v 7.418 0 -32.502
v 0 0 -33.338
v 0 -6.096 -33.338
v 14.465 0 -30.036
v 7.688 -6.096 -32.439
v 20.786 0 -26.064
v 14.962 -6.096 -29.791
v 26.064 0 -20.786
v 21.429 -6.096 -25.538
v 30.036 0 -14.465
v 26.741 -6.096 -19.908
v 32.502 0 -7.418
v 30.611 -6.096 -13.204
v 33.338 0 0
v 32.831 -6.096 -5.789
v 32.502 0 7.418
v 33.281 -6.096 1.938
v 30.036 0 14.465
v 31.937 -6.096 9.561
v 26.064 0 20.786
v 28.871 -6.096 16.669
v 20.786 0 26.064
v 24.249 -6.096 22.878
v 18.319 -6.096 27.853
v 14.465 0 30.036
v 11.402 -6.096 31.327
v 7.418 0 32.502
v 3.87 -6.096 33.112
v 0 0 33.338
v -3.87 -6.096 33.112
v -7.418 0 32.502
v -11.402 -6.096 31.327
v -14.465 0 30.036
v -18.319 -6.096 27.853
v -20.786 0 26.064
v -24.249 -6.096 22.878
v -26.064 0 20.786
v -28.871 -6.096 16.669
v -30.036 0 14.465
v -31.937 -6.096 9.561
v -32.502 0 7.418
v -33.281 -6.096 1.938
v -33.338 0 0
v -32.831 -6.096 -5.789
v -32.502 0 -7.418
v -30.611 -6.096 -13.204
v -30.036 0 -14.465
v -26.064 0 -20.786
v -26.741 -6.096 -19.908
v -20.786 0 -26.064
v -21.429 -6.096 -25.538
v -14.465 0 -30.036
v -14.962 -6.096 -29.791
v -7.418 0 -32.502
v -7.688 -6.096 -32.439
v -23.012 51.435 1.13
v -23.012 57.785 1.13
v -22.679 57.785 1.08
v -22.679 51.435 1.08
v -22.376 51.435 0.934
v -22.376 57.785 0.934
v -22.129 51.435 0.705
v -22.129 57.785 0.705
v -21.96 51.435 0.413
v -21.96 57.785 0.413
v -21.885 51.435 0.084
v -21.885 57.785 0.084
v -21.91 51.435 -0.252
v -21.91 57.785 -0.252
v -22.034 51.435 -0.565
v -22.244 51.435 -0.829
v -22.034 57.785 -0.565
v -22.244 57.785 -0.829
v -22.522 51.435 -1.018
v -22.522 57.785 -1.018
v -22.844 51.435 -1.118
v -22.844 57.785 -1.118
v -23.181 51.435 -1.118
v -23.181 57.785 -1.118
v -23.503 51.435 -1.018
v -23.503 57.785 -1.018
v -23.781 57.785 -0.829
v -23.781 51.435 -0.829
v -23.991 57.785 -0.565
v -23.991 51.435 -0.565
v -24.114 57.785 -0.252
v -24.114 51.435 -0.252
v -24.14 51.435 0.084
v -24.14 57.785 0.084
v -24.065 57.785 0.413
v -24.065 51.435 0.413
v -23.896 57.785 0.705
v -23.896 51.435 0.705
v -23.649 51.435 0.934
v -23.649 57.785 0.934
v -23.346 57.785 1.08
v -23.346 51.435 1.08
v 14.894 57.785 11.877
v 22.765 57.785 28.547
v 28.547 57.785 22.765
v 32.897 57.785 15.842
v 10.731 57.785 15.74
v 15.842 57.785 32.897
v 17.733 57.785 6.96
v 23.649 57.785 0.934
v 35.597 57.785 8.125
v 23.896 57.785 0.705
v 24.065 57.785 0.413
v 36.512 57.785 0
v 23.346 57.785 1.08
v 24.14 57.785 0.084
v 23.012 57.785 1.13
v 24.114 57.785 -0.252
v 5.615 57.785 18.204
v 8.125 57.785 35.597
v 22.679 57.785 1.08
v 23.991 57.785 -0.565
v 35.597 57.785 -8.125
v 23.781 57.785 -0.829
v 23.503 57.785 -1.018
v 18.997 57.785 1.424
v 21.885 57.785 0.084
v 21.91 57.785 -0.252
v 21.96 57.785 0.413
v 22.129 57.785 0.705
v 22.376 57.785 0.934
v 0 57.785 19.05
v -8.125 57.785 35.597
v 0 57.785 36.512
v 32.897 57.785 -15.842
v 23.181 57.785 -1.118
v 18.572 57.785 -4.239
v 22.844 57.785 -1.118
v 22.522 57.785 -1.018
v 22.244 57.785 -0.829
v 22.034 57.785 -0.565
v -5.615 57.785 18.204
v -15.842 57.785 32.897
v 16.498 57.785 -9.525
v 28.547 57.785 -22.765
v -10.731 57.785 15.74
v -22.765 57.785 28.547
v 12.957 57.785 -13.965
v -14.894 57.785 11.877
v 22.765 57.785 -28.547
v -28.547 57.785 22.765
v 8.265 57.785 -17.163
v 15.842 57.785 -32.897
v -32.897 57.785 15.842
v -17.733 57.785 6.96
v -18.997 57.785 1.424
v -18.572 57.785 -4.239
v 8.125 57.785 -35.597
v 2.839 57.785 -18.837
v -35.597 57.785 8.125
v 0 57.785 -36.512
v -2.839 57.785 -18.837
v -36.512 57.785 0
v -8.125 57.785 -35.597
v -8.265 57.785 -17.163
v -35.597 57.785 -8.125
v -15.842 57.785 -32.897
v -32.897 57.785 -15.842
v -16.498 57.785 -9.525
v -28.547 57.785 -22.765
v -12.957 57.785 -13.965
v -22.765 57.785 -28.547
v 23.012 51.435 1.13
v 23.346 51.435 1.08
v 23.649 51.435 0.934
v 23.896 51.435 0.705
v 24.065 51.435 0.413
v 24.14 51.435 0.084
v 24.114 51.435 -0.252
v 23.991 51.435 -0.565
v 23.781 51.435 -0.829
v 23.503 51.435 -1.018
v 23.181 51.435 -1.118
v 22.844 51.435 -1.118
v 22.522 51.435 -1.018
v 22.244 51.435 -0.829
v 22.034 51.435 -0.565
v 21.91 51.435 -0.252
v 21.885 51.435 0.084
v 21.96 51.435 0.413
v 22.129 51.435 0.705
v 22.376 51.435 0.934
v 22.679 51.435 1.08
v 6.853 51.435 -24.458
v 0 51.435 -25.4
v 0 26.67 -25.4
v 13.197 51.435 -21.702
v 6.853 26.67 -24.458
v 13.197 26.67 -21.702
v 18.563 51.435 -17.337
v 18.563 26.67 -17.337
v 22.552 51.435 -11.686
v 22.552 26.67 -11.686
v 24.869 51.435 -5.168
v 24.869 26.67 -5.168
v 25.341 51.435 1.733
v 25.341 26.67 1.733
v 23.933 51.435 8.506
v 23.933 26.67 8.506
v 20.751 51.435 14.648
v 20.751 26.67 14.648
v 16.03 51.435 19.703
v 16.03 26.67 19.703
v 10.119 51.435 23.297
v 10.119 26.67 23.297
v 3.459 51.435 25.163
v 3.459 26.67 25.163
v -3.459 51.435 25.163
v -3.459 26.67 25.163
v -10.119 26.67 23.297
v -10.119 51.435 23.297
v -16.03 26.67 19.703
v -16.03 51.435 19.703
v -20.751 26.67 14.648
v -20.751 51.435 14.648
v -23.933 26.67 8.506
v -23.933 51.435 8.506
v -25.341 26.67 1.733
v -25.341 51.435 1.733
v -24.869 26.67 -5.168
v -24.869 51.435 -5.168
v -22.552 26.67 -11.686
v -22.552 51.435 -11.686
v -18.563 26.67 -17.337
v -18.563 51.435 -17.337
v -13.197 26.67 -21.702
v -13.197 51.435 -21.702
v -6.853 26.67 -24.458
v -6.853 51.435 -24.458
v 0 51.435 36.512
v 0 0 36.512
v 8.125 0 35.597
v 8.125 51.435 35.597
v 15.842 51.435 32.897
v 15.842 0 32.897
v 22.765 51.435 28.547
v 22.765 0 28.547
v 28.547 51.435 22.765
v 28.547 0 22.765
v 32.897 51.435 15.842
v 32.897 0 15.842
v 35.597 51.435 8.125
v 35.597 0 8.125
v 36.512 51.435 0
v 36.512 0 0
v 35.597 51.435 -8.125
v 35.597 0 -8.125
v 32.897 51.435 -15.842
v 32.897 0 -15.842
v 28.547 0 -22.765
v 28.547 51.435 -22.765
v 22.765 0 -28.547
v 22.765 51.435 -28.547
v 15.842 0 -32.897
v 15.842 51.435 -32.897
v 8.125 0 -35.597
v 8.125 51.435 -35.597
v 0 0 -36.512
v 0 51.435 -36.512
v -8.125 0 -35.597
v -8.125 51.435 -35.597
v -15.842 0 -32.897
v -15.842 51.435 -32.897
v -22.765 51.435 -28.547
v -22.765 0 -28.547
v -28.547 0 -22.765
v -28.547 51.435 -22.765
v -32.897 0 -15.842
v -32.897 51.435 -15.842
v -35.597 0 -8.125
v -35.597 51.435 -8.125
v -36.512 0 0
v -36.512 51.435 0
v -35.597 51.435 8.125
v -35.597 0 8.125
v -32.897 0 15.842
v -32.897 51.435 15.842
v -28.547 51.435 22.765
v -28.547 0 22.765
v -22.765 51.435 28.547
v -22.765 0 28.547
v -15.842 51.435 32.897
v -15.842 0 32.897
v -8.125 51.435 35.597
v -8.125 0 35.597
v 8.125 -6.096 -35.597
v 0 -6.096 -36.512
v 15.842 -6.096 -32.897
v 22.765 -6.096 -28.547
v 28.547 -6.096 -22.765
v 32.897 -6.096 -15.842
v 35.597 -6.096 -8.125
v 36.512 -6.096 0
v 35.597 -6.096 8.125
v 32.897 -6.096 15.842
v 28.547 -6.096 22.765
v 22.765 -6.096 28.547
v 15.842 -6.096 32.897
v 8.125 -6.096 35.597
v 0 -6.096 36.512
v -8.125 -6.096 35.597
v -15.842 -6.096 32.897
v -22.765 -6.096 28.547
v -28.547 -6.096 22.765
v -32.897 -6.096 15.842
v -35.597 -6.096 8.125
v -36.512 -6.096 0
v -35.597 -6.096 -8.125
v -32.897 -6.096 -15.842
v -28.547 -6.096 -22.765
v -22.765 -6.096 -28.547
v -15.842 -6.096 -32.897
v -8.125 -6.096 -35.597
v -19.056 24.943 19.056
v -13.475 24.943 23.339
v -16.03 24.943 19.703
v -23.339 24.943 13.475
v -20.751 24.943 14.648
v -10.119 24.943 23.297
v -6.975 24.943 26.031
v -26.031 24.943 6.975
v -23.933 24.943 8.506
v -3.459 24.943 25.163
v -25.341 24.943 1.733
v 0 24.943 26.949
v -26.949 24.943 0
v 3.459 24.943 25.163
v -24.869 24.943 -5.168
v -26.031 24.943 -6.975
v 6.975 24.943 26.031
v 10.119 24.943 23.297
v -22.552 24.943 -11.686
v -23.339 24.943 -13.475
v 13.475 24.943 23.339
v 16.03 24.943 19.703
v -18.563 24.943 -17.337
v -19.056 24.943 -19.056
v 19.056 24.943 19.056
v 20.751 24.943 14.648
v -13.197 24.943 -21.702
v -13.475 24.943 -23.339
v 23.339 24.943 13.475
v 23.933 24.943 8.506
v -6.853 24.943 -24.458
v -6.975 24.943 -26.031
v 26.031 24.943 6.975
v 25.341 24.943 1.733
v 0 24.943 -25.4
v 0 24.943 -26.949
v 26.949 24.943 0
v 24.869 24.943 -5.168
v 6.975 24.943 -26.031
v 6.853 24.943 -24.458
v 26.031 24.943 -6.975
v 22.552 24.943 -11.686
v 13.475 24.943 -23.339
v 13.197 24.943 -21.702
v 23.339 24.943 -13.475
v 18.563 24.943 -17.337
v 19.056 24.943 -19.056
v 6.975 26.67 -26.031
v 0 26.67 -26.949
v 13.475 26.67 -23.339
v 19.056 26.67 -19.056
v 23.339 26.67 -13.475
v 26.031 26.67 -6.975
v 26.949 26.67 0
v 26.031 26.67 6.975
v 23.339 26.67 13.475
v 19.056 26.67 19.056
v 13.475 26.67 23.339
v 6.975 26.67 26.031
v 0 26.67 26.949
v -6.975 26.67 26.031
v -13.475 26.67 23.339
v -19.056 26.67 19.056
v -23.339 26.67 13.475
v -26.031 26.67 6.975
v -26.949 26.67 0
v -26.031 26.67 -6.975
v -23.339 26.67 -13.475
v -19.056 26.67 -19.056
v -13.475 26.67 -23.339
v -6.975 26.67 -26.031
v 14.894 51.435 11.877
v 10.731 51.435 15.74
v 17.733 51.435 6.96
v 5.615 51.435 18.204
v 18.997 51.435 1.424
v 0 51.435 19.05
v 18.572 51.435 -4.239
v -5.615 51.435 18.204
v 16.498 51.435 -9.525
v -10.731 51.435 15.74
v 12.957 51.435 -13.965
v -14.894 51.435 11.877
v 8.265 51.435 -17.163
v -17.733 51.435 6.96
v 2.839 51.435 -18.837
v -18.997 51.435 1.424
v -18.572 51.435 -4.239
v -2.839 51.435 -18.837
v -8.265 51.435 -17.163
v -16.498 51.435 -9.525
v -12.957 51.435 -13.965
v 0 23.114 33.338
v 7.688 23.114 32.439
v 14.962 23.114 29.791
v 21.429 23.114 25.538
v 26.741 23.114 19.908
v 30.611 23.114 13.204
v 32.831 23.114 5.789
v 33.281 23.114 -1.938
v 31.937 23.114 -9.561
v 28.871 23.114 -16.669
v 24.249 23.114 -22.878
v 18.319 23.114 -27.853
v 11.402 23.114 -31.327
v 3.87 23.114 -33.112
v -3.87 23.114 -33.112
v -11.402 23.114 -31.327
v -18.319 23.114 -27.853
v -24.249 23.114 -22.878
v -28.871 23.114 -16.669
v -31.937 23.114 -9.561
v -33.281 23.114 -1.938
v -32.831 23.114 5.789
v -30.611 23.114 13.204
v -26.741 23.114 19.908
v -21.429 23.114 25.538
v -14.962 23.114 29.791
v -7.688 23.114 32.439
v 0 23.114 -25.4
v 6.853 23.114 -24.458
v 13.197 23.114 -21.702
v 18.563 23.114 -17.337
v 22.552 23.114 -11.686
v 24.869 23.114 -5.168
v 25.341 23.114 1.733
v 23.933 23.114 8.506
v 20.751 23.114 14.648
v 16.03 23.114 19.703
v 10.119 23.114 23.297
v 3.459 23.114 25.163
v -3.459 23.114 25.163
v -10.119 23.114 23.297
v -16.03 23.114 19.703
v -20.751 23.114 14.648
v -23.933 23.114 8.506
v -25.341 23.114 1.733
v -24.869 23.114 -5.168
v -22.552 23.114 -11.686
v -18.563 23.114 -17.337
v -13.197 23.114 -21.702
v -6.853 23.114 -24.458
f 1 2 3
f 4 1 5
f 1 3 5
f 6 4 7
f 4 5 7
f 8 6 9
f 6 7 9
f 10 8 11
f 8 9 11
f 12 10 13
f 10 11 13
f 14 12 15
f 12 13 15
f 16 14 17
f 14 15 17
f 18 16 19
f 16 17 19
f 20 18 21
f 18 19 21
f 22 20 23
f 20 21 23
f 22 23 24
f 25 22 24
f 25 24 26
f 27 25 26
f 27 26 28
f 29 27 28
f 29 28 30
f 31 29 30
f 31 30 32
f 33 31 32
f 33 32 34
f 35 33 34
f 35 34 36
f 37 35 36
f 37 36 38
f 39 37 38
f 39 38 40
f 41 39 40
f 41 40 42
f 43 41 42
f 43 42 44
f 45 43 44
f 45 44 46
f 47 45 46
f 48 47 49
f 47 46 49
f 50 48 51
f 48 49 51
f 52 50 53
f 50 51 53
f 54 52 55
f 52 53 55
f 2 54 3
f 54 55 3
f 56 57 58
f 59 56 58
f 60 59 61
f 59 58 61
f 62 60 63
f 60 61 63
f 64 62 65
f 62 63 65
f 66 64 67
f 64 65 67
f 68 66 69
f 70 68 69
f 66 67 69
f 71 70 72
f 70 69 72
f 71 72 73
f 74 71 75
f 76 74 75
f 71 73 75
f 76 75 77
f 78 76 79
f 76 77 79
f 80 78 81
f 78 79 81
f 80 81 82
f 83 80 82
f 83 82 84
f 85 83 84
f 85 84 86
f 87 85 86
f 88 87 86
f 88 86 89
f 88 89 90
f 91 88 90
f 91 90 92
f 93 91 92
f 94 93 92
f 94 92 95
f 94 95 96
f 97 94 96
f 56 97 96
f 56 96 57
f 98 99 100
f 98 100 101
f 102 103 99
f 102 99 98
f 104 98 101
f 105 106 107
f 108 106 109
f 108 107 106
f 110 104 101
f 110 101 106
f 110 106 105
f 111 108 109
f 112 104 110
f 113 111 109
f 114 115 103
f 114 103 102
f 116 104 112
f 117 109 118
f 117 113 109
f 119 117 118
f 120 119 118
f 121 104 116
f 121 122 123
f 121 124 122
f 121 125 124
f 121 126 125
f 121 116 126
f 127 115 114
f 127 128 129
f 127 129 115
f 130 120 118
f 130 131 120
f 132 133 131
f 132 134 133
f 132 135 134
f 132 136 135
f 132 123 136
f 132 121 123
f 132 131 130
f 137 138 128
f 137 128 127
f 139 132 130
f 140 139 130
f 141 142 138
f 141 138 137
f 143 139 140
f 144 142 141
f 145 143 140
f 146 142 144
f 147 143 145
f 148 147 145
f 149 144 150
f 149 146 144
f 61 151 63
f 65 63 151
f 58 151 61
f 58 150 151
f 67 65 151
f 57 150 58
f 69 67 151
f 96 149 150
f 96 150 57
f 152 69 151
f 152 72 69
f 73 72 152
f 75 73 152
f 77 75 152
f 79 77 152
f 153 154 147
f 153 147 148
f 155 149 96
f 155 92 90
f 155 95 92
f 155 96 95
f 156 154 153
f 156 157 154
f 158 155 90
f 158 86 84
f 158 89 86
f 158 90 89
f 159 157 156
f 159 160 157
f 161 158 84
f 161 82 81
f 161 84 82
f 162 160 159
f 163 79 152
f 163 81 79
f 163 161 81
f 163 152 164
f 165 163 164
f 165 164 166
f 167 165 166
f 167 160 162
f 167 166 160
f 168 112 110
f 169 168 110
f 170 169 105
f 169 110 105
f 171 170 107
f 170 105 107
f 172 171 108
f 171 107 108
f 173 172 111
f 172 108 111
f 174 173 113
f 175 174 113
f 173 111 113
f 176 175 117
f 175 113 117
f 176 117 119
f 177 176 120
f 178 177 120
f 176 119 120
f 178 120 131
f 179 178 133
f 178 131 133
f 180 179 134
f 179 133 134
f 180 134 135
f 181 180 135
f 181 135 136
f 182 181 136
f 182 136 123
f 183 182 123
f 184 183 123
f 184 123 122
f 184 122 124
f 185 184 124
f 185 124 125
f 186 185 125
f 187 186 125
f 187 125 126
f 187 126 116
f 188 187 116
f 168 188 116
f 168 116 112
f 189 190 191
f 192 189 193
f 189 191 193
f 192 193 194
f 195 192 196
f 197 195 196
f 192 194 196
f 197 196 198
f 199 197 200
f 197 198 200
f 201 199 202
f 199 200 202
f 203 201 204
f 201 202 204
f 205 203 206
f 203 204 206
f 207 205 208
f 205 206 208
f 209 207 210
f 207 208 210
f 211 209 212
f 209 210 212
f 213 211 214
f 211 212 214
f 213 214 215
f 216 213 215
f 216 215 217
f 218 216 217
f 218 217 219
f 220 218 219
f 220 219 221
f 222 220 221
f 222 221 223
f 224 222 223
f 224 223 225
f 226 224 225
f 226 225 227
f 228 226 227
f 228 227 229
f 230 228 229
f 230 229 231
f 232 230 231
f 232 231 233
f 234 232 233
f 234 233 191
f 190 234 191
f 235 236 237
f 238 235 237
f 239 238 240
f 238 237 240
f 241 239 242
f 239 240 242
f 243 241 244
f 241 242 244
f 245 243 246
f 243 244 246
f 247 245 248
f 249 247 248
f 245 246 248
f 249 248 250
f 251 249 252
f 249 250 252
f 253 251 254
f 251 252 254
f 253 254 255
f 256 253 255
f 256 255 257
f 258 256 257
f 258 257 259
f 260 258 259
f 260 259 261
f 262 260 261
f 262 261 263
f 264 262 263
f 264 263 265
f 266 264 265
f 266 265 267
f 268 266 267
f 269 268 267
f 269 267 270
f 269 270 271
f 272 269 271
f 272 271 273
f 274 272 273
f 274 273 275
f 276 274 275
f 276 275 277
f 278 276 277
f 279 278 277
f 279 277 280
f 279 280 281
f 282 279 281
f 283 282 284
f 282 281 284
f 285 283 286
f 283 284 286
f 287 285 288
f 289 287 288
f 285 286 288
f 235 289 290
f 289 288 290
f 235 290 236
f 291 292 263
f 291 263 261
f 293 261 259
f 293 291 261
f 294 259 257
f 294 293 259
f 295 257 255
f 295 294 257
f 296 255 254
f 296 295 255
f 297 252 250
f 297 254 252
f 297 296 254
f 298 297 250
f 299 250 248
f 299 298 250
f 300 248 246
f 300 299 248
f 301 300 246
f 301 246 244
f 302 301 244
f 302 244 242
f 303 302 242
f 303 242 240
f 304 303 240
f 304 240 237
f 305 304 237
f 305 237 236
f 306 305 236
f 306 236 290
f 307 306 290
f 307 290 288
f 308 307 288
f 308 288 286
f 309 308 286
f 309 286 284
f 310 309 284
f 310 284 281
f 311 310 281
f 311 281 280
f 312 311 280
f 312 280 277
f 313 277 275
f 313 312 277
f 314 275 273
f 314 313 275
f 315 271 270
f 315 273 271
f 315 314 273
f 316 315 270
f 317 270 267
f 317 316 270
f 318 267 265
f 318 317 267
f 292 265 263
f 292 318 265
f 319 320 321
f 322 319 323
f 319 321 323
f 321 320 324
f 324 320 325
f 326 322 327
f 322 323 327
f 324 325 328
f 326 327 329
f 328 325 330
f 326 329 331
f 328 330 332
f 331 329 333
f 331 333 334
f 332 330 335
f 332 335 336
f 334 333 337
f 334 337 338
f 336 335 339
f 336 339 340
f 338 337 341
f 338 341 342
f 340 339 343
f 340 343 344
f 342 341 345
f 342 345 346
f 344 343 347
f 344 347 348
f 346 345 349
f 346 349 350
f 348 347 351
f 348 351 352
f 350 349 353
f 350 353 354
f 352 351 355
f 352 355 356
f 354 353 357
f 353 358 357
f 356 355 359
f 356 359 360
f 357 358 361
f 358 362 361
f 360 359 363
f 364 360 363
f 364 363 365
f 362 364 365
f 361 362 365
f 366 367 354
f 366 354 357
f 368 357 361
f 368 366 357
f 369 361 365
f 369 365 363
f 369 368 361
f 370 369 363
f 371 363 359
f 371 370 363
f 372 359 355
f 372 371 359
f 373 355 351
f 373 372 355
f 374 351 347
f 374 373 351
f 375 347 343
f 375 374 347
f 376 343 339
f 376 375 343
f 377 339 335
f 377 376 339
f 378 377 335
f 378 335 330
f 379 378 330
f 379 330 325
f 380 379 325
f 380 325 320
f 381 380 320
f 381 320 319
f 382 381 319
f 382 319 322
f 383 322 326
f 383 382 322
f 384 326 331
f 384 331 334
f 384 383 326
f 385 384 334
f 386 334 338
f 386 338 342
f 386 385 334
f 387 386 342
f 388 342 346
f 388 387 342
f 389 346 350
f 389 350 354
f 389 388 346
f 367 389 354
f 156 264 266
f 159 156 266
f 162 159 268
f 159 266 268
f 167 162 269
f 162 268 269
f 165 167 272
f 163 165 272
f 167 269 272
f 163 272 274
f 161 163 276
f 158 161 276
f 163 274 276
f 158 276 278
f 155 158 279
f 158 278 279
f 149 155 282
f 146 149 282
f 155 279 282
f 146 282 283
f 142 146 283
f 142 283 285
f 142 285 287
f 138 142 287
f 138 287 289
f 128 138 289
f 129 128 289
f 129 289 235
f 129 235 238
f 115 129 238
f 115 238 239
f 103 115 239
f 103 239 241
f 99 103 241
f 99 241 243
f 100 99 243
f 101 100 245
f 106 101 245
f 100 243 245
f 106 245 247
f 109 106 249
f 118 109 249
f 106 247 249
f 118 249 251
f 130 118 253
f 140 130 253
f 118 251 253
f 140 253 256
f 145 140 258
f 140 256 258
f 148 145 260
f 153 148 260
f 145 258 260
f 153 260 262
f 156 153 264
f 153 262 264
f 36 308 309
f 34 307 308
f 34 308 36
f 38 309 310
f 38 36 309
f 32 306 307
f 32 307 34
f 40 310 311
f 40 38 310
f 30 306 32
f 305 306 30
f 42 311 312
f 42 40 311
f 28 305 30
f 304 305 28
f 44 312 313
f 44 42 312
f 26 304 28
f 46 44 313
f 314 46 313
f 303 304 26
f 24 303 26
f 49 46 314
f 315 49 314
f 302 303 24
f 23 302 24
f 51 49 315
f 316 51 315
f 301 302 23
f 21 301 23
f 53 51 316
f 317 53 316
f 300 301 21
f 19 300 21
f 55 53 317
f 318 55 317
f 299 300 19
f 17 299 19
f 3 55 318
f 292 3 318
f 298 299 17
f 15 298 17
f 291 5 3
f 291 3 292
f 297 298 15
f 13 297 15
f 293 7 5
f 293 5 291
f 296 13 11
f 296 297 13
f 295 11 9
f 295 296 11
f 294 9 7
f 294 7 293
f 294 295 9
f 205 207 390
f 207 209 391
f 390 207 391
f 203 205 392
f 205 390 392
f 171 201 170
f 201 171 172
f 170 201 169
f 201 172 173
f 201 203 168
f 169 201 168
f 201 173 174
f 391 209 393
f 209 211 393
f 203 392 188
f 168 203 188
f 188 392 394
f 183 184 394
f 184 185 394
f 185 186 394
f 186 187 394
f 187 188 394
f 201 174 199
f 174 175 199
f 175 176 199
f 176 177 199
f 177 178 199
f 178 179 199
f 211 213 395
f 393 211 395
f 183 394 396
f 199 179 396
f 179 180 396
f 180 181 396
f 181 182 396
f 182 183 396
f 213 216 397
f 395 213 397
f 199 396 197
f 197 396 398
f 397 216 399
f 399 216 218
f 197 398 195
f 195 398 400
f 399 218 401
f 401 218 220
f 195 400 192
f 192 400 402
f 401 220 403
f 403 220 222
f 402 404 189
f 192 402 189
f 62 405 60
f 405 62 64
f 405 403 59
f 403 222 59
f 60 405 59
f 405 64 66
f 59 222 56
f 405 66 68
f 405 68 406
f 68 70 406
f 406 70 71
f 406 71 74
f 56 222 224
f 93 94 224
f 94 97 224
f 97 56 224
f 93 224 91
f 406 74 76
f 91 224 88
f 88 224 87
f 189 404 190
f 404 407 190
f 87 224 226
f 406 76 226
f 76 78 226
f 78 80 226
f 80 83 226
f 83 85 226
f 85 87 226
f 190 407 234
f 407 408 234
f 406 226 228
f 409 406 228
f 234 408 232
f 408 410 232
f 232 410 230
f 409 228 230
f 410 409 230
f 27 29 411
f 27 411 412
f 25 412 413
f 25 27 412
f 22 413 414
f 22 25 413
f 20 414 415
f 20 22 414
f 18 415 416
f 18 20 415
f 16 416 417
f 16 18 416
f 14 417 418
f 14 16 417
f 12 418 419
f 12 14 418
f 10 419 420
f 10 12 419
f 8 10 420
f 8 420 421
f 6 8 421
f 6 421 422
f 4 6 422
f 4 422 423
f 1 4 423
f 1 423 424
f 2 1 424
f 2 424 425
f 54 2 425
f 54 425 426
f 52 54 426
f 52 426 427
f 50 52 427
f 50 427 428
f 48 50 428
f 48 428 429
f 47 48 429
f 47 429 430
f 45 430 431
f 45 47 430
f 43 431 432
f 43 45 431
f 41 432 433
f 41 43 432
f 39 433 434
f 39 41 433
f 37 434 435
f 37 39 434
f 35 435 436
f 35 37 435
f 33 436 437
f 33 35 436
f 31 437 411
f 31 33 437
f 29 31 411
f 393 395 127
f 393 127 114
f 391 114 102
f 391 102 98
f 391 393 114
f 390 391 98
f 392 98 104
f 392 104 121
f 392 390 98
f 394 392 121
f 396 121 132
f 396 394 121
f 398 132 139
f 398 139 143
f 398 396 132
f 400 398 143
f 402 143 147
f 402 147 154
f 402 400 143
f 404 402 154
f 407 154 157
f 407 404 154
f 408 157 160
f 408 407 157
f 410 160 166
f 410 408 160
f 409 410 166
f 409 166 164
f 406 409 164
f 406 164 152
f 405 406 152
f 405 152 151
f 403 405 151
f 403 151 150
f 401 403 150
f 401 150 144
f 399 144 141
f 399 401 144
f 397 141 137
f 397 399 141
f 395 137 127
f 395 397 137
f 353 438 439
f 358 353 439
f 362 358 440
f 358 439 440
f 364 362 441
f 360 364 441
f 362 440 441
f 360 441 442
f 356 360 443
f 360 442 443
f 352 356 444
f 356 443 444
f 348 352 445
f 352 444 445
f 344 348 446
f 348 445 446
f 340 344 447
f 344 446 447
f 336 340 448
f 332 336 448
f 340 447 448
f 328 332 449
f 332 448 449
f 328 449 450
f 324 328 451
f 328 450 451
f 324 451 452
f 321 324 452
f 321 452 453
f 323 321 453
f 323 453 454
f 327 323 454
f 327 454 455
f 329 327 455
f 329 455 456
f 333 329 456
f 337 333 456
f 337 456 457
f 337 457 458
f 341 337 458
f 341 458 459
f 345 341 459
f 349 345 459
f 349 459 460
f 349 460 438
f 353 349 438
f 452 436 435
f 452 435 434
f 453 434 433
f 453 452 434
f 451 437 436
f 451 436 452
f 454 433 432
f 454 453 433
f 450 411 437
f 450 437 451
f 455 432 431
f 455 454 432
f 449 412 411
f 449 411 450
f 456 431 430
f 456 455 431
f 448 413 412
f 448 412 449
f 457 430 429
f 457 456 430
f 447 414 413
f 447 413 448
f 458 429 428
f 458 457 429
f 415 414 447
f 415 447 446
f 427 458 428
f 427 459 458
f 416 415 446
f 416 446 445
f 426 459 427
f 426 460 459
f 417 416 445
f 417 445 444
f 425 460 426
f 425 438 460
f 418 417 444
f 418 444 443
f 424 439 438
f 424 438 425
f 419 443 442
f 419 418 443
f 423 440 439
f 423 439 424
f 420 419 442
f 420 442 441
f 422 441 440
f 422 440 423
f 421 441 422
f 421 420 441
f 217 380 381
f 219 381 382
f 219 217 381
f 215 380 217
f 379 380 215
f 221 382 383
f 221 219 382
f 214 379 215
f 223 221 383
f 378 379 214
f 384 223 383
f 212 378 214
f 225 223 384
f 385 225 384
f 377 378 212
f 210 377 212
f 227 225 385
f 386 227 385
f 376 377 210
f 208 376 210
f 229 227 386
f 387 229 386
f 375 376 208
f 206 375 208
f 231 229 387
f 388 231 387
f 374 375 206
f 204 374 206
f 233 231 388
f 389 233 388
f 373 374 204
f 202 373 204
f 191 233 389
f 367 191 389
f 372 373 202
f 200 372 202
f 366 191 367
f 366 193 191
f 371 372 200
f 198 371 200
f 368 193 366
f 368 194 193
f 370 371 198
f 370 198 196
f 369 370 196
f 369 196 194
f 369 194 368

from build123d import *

# Parameters (mm, degrees)
SKETCH1_R           = 36.5125
SKETCH1_R_2         = 33.3375
BOSS_EXTRUDE1_DEPTH = 51.435
BOSS_EXTRUDE5_START = 6.096
SKETCH6_R           = 36.5125
SKETCH6_R_2         = 33.3375
BOSS_EXTRUDE5_DEPTH = 6.096
SKETCH12_R          = 33.3375
SKETCH12_R_2        = 25.4
BOSS_EXTRUDE8_DEPTH = 28.321
SKETCH2_R           = 36.5125
SKETCH2_R_2         = 19.05
BOSS_EXTRUDE2_DEPTH = 6.35
SKETCH4_R           = 26.9494
CUT_EXTRUDE1_DEPTH  = 1.7272
SKETCH5_R           = 1.1303
CUT_EXTRUDE5_DEPTH  = 83.140778384


with BuildPart() as part:
    # Sketch1 → Boss-Extrude1 (new body)
    with BuildSketch(Plane(origin=(0, 0, 0), x_dir=(1, 0, 0), z_dir=(0, 1, 0))):
        with Locations(Location((0, 0, 0), (0, 0, 270))):
            Circle(SKETCH1_R)
        with Locations(Location((0, 0, 0), (0, 0, 270))):
            Circle(SKETCH1_R_2, mode=Mode.SUBTRACT)
    extrude(amount=BOSS_EXTRUDE1_DEPTH)

    # Sketch6 → Boss-Extrude5 (add)
    with BuildSketch(Plane.XZ.offset(BOSS_EXTRUDE5_START)):
        with Locations(Location((0, 0, 0), (0, 0, 270))):
            Circle(SKETCH6_R)
        with Locations(Location((0, 0, 0), (0, 0, 270))):
            Circle(SKETCH6_R_2, mode=Mode.SUBTRACT)
    extrude(amount=-BOSS_EXTRUDE5_DEPTH)

    # Sketch12 → Boss-Extrude8 (add)
    with BuildSketch(Plane.XZ.offset(-23.114)):
        with Locations(Location((0, 0, 0), (0, 0, 270))):
            Circle(SKETCH12_R)
        with Locations(Location((0, 0, 0), (0, 0, 270))):
            Circle(SKETCH12_R_2, mode=Mode.SUBTRACT)
    extrude(amount=-BOSS_EXTRUDE8_DEPTH)

    # Sketch2 → Boss-Extrude2 (add)
    with BuildSketch(Plane(origin=(0, 51.435, 0), x_dir=(1, 0, 0), z_dir=(0, 1, 0))):
        with Locations(Location((0, 0, 0), (0, 0, 90))):
            Circle(SKETCH2_R)
        with Locations(Location((0, 0, 0), (0, 0, 270))):
            Circle(SKETCH2_R_2, mode=Mode.SUBTRACT)
    extrude(amount=BOSS_EXTRUDE2_DEPTH)

    # Sketch4 → Cut-Extrude1 (cut)
    with BuildSketch(Plane.XZ.offset(-26.67)):
        with Locations(Location((0, 0, 0), (0, 0, 270))):
            Circle(SKETCH4_R)
    extrude(amount=CUT_EXTRUDE1_DEPTH, mode=Mode.SUBTRACT)

    # Sketch5 → Cut-Extrude5 (cut, through all)
    with BuildSketch(Plane(origin=(0, 57.785, 0), x_dir=(1, 0, 0), z_dir=(0, 1, 0))):
        with Locations(Location((-23.0124, 0, 0), (0, 0, 270))):
            Circle(SKETCH5_R)
        with Locations(Location((23.0124, 0, 0), (0, 0, 270))):
            Circle(SKETCH5_R)
    extrude(amount=-CUT_EXTRUDE5_DEPTH, mode=Mode.SUBTRACT)


solid = part.part
